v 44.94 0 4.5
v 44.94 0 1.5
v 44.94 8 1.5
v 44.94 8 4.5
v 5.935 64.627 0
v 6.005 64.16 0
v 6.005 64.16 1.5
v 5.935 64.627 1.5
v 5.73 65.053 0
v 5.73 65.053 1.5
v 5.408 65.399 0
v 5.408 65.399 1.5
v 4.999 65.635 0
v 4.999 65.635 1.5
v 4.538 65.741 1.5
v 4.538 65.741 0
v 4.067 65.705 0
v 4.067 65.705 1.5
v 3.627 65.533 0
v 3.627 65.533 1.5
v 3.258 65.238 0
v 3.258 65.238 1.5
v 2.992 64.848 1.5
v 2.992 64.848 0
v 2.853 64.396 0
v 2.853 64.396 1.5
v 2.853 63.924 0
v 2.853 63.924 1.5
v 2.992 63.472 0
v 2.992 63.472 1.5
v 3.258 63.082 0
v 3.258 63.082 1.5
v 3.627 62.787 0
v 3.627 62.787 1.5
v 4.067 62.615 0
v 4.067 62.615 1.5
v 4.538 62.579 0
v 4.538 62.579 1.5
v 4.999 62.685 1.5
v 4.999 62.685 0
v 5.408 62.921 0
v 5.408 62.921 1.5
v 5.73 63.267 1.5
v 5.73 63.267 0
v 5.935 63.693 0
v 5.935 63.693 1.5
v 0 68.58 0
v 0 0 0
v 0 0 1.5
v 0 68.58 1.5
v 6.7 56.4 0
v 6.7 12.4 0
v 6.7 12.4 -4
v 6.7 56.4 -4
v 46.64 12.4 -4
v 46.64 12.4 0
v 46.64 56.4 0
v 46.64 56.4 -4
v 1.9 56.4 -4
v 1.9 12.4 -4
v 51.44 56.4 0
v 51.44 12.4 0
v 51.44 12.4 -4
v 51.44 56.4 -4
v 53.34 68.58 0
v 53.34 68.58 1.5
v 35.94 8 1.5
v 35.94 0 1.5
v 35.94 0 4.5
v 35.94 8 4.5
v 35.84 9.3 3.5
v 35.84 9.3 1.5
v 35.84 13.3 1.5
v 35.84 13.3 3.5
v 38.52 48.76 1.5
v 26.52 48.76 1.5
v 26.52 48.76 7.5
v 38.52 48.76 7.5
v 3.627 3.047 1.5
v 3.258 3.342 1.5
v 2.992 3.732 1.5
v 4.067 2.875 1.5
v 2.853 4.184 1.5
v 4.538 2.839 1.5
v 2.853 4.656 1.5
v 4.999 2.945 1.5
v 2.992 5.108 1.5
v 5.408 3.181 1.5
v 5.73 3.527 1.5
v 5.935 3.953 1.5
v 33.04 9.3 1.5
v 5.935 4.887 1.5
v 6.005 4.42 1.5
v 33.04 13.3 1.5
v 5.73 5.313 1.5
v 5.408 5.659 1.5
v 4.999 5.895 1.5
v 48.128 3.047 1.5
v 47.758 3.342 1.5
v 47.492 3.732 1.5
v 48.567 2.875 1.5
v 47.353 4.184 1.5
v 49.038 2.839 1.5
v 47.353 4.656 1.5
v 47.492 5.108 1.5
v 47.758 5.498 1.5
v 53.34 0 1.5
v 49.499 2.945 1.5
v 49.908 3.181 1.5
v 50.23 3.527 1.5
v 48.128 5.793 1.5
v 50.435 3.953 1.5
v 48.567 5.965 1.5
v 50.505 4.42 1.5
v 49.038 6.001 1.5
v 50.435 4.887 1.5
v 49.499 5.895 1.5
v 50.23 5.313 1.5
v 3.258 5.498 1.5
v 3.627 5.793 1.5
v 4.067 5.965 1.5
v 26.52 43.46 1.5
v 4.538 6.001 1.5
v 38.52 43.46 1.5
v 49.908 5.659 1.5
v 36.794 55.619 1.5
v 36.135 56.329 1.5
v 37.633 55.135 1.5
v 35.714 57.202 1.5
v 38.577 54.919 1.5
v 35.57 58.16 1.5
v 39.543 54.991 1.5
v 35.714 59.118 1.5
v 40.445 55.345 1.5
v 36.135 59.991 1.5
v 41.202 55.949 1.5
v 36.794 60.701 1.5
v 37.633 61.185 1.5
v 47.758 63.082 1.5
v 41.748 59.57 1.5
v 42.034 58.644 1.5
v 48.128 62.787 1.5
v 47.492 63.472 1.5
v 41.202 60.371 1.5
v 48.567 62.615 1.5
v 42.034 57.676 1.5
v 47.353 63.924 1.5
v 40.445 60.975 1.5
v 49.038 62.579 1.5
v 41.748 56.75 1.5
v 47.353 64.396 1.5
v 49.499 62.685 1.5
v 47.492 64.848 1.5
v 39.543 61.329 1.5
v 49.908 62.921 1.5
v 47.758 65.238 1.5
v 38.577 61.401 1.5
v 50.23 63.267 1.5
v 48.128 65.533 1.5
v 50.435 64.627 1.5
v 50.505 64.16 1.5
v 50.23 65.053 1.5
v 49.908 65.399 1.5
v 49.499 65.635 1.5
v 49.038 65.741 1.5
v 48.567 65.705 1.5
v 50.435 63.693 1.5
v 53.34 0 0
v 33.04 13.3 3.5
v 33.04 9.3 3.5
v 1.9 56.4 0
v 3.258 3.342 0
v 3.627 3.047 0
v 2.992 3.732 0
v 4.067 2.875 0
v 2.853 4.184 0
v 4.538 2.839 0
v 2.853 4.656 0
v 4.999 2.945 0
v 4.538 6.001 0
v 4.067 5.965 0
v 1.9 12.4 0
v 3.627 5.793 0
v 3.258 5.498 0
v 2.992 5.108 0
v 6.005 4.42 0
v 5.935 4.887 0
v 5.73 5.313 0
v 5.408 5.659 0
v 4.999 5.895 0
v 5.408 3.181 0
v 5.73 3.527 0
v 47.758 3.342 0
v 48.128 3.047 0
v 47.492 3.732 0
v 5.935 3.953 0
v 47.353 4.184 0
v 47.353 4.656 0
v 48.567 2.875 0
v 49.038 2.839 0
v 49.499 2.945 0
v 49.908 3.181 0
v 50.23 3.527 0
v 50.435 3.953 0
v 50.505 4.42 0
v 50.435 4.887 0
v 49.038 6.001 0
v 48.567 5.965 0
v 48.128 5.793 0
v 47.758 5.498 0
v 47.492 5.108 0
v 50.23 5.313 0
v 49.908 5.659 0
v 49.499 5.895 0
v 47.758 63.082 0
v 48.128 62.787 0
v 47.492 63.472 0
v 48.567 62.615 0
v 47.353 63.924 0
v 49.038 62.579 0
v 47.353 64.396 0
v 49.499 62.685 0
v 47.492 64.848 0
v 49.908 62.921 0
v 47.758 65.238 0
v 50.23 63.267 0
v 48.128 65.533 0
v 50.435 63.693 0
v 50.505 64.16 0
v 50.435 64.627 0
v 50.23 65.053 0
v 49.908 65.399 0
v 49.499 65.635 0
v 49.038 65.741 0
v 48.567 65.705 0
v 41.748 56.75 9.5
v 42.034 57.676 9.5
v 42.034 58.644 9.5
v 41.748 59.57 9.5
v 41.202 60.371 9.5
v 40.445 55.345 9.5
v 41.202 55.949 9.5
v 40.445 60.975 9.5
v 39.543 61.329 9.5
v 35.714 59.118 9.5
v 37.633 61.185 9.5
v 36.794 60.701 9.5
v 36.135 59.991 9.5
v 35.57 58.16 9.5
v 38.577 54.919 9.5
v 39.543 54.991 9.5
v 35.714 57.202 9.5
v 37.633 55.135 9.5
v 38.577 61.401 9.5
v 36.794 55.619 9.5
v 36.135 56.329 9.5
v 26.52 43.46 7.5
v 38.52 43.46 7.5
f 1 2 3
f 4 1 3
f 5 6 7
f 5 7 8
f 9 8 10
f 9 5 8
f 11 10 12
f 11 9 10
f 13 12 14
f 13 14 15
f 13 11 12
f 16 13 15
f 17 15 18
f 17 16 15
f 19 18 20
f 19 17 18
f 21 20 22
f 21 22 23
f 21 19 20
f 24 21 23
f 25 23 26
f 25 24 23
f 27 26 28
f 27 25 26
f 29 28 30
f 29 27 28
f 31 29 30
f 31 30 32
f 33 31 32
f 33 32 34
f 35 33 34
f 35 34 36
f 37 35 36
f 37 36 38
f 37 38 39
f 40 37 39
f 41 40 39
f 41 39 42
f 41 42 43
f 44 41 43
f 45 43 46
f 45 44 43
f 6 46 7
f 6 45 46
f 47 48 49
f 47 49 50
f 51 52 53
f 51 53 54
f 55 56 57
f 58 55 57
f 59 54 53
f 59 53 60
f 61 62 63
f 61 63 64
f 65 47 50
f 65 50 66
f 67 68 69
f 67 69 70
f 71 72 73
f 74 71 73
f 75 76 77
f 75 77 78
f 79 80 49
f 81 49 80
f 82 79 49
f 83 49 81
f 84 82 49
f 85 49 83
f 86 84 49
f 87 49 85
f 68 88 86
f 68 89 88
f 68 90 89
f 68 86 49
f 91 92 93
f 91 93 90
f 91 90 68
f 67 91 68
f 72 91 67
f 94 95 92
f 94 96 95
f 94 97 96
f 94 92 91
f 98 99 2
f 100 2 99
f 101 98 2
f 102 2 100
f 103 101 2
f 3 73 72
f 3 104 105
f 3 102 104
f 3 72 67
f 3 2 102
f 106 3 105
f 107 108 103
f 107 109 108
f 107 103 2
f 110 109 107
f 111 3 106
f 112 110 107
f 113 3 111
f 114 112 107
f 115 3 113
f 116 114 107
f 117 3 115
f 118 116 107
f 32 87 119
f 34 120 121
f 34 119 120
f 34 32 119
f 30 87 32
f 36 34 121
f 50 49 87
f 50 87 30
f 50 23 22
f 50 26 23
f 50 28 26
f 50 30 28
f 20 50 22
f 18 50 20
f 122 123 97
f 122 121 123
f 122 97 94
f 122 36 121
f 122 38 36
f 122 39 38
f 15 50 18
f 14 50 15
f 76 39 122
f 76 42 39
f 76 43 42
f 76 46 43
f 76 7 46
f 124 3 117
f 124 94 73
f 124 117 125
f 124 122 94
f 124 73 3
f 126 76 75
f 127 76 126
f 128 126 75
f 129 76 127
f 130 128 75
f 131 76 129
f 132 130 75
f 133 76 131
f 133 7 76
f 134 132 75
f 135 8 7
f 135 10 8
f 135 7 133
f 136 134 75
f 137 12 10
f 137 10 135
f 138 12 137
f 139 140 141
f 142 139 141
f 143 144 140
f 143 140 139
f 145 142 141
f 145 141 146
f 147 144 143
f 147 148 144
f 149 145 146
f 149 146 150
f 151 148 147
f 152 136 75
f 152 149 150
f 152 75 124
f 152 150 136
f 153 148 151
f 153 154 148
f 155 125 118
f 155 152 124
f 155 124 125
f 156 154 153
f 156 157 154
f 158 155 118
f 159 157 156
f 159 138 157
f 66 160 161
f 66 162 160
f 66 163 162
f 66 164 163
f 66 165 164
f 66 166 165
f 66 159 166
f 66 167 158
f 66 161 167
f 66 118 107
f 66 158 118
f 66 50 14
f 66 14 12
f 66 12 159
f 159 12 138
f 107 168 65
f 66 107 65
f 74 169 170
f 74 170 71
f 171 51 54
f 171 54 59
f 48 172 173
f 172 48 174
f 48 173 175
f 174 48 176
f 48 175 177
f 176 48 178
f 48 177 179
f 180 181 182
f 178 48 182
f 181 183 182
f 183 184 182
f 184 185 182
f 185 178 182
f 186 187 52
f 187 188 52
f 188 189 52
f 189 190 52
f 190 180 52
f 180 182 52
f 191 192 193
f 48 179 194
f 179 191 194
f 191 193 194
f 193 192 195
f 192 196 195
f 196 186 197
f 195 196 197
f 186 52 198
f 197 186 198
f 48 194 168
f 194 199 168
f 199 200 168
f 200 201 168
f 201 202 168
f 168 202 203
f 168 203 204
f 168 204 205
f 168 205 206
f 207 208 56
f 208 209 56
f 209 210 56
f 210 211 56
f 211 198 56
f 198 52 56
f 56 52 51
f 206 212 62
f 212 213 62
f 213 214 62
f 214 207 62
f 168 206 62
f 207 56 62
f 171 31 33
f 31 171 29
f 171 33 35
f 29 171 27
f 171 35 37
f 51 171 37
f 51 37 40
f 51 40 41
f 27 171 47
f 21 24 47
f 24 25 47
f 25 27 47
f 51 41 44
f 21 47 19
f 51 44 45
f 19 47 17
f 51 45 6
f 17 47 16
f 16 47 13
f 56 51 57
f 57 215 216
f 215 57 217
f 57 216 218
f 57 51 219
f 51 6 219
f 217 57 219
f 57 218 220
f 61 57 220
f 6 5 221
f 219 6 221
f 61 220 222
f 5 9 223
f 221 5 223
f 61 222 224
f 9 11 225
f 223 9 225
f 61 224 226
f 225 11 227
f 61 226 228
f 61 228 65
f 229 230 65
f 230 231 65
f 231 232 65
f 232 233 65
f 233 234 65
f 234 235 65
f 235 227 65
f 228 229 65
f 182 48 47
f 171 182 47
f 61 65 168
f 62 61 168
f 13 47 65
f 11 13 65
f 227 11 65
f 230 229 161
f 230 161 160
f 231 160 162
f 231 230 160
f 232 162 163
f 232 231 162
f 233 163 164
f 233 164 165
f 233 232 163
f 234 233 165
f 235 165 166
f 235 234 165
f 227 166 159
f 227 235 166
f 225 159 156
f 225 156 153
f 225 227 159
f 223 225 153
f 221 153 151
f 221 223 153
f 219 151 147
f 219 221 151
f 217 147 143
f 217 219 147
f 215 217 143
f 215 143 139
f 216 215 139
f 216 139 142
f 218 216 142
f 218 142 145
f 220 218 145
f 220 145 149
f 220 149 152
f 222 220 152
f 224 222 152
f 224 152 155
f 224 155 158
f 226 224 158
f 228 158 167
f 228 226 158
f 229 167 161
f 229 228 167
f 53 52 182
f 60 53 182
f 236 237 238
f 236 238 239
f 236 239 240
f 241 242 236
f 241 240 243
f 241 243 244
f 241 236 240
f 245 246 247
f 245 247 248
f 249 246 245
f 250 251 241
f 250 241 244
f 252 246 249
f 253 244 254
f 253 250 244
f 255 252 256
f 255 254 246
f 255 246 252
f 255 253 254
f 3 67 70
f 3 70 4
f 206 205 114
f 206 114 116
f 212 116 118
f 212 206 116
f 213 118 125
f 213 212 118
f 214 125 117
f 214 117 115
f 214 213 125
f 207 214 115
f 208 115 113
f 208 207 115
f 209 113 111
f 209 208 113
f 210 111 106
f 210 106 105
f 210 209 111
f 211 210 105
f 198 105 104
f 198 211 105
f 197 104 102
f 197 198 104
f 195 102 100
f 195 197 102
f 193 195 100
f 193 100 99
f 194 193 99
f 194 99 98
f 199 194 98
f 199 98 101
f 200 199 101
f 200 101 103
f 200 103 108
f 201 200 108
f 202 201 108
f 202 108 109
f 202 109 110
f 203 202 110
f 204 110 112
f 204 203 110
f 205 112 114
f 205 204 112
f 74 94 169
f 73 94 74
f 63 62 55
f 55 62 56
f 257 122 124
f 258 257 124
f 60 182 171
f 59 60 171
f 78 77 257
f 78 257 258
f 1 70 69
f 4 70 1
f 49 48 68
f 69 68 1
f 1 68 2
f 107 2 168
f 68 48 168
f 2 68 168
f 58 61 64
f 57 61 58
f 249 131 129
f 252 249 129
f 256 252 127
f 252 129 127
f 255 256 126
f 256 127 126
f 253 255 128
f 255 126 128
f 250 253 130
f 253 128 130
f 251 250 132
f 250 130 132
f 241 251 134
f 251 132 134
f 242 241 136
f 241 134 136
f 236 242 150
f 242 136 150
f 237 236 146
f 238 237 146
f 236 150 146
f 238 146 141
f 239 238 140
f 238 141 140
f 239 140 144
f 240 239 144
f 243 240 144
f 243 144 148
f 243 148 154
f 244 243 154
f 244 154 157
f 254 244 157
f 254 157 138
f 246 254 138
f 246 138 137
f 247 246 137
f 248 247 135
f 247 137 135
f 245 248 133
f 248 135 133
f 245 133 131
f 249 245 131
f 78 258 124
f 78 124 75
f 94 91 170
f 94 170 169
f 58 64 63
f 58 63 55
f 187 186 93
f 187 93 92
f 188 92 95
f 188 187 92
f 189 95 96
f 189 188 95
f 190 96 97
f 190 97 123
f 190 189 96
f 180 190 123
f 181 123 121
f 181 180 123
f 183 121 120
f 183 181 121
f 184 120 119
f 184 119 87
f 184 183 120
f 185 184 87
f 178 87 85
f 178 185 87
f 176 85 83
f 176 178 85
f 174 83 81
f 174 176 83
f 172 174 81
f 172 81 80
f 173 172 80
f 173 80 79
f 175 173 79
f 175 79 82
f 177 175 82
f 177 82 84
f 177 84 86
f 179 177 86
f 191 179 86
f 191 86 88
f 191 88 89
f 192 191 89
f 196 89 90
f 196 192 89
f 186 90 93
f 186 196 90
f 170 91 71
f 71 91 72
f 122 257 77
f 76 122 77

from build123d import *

# Parameters (mm, degrees)
SKETCH_1_W      = 53.34
SKETCH_1_H      = 68.58
SKETCH_1_R      = 1.585
EXTRUDE_1_DEPTH = 1.5
SKETCH_2_R      = 3.25
EXTRUDE_2_DEPTH = 8
SKETCH_3_W      = 12
SKETCH_3_H      = 5.3
EXTRUDE_3_DEPTH = 6
SKETCH_4_W      = 2.8
SKETCH_4_H      = 4
EXTRUDE_4_DEPTH = 2
SKETCH_5_W      = 4.8
SKETCH_5_H      = 44
EXTRUDE_5_DEPTH = 4
SKETCH_6_W      = 9
SKETCH_6_H      = 8
EXTRUDE_6_DEPTH = 3


with BuildPart() as part:
    # 草图1 → 凸台-拉伸1 (new body)
    with BuildSketch(Plane.XY):
        with Locations((26.67, 34.29)):
            Rectangle(SKETCH_1_W, SKETCH_1_H)
        with Locations((48.92, 64.16)):
            Circle(SKETCH_1_R, mode=Mode.SUBTRACT)
        with Locations((4.42, 64.16)):
            Circle(SKETCH_1_R, mode=Mode.SUBTRACT)
        with Locations((4.42, 4.42)):
            Circle(SKETCH_1_R, mode=Mode.SUBTRACT)
        with Locations((48.92, 4.42)):
            Circle(SKETCH_1_R, mode=Mode.SUBTRACT)
    extrude(amount=EXTRUDE_1_DEPTH)

    # 草图2 → 凸台-拉伸2 (add)
    with BuildSketch(Plane.XY.offset(1.5)):
        with Locations(Location((38.82, 58.16, 0), (0, 0, 180))):
            Circle(SKETCH_2_R)
    extrude(amount=EXTRUDE_2_DEPTH)

    # 草图3 → 凸台-拉伸3 (add)
    with BuildSketch(Plane.XY.offset(1.5)):
        with Locations((32.52, 46.11)):
            Rectangle(SKETCH_3_W, SKETCH_3_H)
    extrude(amount=EXTRUDE_3_DEPTH)

    # 草图4 → 凸台-拉伸4 (add)
    with BuildSketch(Plane.XY.offset(1.5)):
        with Locations((34.44, 11.3)):
            Rectangle(SKETCH_4_W, SKETCH_4_H)
    extrude(amount=EXTRUDE_4_DEPTH)

    # 草图5 → 凸台-拉伸5 (add)
    with BuildSketch(Plane(origin=(0, 0, 0), x_dir=(-1, 0, 0), z_dir=(0, 0, -1))):
        with Locations((-49.04, 34.4)):
            Rectangle(SKETCH_5_W, SKETCH_5_H)
        with Locations((-4.3, 34.4)):
            Rectangle(SKETCH_5_W, SKETCH_5_H)
    extrude(amount=EXTRUDE_5_DEPTH)

    # 草图6 → 凸台-拉伸6 (add)
    with BuildSketch(Plane.XY.offset(1.5)):
        with Locations((40.44, 4)):
            Rectangle(SKETCH_6_W, SKETCH_6_H)
    extrude(amount=EXTRUDE_6_DEPTH)


solid = part.part
